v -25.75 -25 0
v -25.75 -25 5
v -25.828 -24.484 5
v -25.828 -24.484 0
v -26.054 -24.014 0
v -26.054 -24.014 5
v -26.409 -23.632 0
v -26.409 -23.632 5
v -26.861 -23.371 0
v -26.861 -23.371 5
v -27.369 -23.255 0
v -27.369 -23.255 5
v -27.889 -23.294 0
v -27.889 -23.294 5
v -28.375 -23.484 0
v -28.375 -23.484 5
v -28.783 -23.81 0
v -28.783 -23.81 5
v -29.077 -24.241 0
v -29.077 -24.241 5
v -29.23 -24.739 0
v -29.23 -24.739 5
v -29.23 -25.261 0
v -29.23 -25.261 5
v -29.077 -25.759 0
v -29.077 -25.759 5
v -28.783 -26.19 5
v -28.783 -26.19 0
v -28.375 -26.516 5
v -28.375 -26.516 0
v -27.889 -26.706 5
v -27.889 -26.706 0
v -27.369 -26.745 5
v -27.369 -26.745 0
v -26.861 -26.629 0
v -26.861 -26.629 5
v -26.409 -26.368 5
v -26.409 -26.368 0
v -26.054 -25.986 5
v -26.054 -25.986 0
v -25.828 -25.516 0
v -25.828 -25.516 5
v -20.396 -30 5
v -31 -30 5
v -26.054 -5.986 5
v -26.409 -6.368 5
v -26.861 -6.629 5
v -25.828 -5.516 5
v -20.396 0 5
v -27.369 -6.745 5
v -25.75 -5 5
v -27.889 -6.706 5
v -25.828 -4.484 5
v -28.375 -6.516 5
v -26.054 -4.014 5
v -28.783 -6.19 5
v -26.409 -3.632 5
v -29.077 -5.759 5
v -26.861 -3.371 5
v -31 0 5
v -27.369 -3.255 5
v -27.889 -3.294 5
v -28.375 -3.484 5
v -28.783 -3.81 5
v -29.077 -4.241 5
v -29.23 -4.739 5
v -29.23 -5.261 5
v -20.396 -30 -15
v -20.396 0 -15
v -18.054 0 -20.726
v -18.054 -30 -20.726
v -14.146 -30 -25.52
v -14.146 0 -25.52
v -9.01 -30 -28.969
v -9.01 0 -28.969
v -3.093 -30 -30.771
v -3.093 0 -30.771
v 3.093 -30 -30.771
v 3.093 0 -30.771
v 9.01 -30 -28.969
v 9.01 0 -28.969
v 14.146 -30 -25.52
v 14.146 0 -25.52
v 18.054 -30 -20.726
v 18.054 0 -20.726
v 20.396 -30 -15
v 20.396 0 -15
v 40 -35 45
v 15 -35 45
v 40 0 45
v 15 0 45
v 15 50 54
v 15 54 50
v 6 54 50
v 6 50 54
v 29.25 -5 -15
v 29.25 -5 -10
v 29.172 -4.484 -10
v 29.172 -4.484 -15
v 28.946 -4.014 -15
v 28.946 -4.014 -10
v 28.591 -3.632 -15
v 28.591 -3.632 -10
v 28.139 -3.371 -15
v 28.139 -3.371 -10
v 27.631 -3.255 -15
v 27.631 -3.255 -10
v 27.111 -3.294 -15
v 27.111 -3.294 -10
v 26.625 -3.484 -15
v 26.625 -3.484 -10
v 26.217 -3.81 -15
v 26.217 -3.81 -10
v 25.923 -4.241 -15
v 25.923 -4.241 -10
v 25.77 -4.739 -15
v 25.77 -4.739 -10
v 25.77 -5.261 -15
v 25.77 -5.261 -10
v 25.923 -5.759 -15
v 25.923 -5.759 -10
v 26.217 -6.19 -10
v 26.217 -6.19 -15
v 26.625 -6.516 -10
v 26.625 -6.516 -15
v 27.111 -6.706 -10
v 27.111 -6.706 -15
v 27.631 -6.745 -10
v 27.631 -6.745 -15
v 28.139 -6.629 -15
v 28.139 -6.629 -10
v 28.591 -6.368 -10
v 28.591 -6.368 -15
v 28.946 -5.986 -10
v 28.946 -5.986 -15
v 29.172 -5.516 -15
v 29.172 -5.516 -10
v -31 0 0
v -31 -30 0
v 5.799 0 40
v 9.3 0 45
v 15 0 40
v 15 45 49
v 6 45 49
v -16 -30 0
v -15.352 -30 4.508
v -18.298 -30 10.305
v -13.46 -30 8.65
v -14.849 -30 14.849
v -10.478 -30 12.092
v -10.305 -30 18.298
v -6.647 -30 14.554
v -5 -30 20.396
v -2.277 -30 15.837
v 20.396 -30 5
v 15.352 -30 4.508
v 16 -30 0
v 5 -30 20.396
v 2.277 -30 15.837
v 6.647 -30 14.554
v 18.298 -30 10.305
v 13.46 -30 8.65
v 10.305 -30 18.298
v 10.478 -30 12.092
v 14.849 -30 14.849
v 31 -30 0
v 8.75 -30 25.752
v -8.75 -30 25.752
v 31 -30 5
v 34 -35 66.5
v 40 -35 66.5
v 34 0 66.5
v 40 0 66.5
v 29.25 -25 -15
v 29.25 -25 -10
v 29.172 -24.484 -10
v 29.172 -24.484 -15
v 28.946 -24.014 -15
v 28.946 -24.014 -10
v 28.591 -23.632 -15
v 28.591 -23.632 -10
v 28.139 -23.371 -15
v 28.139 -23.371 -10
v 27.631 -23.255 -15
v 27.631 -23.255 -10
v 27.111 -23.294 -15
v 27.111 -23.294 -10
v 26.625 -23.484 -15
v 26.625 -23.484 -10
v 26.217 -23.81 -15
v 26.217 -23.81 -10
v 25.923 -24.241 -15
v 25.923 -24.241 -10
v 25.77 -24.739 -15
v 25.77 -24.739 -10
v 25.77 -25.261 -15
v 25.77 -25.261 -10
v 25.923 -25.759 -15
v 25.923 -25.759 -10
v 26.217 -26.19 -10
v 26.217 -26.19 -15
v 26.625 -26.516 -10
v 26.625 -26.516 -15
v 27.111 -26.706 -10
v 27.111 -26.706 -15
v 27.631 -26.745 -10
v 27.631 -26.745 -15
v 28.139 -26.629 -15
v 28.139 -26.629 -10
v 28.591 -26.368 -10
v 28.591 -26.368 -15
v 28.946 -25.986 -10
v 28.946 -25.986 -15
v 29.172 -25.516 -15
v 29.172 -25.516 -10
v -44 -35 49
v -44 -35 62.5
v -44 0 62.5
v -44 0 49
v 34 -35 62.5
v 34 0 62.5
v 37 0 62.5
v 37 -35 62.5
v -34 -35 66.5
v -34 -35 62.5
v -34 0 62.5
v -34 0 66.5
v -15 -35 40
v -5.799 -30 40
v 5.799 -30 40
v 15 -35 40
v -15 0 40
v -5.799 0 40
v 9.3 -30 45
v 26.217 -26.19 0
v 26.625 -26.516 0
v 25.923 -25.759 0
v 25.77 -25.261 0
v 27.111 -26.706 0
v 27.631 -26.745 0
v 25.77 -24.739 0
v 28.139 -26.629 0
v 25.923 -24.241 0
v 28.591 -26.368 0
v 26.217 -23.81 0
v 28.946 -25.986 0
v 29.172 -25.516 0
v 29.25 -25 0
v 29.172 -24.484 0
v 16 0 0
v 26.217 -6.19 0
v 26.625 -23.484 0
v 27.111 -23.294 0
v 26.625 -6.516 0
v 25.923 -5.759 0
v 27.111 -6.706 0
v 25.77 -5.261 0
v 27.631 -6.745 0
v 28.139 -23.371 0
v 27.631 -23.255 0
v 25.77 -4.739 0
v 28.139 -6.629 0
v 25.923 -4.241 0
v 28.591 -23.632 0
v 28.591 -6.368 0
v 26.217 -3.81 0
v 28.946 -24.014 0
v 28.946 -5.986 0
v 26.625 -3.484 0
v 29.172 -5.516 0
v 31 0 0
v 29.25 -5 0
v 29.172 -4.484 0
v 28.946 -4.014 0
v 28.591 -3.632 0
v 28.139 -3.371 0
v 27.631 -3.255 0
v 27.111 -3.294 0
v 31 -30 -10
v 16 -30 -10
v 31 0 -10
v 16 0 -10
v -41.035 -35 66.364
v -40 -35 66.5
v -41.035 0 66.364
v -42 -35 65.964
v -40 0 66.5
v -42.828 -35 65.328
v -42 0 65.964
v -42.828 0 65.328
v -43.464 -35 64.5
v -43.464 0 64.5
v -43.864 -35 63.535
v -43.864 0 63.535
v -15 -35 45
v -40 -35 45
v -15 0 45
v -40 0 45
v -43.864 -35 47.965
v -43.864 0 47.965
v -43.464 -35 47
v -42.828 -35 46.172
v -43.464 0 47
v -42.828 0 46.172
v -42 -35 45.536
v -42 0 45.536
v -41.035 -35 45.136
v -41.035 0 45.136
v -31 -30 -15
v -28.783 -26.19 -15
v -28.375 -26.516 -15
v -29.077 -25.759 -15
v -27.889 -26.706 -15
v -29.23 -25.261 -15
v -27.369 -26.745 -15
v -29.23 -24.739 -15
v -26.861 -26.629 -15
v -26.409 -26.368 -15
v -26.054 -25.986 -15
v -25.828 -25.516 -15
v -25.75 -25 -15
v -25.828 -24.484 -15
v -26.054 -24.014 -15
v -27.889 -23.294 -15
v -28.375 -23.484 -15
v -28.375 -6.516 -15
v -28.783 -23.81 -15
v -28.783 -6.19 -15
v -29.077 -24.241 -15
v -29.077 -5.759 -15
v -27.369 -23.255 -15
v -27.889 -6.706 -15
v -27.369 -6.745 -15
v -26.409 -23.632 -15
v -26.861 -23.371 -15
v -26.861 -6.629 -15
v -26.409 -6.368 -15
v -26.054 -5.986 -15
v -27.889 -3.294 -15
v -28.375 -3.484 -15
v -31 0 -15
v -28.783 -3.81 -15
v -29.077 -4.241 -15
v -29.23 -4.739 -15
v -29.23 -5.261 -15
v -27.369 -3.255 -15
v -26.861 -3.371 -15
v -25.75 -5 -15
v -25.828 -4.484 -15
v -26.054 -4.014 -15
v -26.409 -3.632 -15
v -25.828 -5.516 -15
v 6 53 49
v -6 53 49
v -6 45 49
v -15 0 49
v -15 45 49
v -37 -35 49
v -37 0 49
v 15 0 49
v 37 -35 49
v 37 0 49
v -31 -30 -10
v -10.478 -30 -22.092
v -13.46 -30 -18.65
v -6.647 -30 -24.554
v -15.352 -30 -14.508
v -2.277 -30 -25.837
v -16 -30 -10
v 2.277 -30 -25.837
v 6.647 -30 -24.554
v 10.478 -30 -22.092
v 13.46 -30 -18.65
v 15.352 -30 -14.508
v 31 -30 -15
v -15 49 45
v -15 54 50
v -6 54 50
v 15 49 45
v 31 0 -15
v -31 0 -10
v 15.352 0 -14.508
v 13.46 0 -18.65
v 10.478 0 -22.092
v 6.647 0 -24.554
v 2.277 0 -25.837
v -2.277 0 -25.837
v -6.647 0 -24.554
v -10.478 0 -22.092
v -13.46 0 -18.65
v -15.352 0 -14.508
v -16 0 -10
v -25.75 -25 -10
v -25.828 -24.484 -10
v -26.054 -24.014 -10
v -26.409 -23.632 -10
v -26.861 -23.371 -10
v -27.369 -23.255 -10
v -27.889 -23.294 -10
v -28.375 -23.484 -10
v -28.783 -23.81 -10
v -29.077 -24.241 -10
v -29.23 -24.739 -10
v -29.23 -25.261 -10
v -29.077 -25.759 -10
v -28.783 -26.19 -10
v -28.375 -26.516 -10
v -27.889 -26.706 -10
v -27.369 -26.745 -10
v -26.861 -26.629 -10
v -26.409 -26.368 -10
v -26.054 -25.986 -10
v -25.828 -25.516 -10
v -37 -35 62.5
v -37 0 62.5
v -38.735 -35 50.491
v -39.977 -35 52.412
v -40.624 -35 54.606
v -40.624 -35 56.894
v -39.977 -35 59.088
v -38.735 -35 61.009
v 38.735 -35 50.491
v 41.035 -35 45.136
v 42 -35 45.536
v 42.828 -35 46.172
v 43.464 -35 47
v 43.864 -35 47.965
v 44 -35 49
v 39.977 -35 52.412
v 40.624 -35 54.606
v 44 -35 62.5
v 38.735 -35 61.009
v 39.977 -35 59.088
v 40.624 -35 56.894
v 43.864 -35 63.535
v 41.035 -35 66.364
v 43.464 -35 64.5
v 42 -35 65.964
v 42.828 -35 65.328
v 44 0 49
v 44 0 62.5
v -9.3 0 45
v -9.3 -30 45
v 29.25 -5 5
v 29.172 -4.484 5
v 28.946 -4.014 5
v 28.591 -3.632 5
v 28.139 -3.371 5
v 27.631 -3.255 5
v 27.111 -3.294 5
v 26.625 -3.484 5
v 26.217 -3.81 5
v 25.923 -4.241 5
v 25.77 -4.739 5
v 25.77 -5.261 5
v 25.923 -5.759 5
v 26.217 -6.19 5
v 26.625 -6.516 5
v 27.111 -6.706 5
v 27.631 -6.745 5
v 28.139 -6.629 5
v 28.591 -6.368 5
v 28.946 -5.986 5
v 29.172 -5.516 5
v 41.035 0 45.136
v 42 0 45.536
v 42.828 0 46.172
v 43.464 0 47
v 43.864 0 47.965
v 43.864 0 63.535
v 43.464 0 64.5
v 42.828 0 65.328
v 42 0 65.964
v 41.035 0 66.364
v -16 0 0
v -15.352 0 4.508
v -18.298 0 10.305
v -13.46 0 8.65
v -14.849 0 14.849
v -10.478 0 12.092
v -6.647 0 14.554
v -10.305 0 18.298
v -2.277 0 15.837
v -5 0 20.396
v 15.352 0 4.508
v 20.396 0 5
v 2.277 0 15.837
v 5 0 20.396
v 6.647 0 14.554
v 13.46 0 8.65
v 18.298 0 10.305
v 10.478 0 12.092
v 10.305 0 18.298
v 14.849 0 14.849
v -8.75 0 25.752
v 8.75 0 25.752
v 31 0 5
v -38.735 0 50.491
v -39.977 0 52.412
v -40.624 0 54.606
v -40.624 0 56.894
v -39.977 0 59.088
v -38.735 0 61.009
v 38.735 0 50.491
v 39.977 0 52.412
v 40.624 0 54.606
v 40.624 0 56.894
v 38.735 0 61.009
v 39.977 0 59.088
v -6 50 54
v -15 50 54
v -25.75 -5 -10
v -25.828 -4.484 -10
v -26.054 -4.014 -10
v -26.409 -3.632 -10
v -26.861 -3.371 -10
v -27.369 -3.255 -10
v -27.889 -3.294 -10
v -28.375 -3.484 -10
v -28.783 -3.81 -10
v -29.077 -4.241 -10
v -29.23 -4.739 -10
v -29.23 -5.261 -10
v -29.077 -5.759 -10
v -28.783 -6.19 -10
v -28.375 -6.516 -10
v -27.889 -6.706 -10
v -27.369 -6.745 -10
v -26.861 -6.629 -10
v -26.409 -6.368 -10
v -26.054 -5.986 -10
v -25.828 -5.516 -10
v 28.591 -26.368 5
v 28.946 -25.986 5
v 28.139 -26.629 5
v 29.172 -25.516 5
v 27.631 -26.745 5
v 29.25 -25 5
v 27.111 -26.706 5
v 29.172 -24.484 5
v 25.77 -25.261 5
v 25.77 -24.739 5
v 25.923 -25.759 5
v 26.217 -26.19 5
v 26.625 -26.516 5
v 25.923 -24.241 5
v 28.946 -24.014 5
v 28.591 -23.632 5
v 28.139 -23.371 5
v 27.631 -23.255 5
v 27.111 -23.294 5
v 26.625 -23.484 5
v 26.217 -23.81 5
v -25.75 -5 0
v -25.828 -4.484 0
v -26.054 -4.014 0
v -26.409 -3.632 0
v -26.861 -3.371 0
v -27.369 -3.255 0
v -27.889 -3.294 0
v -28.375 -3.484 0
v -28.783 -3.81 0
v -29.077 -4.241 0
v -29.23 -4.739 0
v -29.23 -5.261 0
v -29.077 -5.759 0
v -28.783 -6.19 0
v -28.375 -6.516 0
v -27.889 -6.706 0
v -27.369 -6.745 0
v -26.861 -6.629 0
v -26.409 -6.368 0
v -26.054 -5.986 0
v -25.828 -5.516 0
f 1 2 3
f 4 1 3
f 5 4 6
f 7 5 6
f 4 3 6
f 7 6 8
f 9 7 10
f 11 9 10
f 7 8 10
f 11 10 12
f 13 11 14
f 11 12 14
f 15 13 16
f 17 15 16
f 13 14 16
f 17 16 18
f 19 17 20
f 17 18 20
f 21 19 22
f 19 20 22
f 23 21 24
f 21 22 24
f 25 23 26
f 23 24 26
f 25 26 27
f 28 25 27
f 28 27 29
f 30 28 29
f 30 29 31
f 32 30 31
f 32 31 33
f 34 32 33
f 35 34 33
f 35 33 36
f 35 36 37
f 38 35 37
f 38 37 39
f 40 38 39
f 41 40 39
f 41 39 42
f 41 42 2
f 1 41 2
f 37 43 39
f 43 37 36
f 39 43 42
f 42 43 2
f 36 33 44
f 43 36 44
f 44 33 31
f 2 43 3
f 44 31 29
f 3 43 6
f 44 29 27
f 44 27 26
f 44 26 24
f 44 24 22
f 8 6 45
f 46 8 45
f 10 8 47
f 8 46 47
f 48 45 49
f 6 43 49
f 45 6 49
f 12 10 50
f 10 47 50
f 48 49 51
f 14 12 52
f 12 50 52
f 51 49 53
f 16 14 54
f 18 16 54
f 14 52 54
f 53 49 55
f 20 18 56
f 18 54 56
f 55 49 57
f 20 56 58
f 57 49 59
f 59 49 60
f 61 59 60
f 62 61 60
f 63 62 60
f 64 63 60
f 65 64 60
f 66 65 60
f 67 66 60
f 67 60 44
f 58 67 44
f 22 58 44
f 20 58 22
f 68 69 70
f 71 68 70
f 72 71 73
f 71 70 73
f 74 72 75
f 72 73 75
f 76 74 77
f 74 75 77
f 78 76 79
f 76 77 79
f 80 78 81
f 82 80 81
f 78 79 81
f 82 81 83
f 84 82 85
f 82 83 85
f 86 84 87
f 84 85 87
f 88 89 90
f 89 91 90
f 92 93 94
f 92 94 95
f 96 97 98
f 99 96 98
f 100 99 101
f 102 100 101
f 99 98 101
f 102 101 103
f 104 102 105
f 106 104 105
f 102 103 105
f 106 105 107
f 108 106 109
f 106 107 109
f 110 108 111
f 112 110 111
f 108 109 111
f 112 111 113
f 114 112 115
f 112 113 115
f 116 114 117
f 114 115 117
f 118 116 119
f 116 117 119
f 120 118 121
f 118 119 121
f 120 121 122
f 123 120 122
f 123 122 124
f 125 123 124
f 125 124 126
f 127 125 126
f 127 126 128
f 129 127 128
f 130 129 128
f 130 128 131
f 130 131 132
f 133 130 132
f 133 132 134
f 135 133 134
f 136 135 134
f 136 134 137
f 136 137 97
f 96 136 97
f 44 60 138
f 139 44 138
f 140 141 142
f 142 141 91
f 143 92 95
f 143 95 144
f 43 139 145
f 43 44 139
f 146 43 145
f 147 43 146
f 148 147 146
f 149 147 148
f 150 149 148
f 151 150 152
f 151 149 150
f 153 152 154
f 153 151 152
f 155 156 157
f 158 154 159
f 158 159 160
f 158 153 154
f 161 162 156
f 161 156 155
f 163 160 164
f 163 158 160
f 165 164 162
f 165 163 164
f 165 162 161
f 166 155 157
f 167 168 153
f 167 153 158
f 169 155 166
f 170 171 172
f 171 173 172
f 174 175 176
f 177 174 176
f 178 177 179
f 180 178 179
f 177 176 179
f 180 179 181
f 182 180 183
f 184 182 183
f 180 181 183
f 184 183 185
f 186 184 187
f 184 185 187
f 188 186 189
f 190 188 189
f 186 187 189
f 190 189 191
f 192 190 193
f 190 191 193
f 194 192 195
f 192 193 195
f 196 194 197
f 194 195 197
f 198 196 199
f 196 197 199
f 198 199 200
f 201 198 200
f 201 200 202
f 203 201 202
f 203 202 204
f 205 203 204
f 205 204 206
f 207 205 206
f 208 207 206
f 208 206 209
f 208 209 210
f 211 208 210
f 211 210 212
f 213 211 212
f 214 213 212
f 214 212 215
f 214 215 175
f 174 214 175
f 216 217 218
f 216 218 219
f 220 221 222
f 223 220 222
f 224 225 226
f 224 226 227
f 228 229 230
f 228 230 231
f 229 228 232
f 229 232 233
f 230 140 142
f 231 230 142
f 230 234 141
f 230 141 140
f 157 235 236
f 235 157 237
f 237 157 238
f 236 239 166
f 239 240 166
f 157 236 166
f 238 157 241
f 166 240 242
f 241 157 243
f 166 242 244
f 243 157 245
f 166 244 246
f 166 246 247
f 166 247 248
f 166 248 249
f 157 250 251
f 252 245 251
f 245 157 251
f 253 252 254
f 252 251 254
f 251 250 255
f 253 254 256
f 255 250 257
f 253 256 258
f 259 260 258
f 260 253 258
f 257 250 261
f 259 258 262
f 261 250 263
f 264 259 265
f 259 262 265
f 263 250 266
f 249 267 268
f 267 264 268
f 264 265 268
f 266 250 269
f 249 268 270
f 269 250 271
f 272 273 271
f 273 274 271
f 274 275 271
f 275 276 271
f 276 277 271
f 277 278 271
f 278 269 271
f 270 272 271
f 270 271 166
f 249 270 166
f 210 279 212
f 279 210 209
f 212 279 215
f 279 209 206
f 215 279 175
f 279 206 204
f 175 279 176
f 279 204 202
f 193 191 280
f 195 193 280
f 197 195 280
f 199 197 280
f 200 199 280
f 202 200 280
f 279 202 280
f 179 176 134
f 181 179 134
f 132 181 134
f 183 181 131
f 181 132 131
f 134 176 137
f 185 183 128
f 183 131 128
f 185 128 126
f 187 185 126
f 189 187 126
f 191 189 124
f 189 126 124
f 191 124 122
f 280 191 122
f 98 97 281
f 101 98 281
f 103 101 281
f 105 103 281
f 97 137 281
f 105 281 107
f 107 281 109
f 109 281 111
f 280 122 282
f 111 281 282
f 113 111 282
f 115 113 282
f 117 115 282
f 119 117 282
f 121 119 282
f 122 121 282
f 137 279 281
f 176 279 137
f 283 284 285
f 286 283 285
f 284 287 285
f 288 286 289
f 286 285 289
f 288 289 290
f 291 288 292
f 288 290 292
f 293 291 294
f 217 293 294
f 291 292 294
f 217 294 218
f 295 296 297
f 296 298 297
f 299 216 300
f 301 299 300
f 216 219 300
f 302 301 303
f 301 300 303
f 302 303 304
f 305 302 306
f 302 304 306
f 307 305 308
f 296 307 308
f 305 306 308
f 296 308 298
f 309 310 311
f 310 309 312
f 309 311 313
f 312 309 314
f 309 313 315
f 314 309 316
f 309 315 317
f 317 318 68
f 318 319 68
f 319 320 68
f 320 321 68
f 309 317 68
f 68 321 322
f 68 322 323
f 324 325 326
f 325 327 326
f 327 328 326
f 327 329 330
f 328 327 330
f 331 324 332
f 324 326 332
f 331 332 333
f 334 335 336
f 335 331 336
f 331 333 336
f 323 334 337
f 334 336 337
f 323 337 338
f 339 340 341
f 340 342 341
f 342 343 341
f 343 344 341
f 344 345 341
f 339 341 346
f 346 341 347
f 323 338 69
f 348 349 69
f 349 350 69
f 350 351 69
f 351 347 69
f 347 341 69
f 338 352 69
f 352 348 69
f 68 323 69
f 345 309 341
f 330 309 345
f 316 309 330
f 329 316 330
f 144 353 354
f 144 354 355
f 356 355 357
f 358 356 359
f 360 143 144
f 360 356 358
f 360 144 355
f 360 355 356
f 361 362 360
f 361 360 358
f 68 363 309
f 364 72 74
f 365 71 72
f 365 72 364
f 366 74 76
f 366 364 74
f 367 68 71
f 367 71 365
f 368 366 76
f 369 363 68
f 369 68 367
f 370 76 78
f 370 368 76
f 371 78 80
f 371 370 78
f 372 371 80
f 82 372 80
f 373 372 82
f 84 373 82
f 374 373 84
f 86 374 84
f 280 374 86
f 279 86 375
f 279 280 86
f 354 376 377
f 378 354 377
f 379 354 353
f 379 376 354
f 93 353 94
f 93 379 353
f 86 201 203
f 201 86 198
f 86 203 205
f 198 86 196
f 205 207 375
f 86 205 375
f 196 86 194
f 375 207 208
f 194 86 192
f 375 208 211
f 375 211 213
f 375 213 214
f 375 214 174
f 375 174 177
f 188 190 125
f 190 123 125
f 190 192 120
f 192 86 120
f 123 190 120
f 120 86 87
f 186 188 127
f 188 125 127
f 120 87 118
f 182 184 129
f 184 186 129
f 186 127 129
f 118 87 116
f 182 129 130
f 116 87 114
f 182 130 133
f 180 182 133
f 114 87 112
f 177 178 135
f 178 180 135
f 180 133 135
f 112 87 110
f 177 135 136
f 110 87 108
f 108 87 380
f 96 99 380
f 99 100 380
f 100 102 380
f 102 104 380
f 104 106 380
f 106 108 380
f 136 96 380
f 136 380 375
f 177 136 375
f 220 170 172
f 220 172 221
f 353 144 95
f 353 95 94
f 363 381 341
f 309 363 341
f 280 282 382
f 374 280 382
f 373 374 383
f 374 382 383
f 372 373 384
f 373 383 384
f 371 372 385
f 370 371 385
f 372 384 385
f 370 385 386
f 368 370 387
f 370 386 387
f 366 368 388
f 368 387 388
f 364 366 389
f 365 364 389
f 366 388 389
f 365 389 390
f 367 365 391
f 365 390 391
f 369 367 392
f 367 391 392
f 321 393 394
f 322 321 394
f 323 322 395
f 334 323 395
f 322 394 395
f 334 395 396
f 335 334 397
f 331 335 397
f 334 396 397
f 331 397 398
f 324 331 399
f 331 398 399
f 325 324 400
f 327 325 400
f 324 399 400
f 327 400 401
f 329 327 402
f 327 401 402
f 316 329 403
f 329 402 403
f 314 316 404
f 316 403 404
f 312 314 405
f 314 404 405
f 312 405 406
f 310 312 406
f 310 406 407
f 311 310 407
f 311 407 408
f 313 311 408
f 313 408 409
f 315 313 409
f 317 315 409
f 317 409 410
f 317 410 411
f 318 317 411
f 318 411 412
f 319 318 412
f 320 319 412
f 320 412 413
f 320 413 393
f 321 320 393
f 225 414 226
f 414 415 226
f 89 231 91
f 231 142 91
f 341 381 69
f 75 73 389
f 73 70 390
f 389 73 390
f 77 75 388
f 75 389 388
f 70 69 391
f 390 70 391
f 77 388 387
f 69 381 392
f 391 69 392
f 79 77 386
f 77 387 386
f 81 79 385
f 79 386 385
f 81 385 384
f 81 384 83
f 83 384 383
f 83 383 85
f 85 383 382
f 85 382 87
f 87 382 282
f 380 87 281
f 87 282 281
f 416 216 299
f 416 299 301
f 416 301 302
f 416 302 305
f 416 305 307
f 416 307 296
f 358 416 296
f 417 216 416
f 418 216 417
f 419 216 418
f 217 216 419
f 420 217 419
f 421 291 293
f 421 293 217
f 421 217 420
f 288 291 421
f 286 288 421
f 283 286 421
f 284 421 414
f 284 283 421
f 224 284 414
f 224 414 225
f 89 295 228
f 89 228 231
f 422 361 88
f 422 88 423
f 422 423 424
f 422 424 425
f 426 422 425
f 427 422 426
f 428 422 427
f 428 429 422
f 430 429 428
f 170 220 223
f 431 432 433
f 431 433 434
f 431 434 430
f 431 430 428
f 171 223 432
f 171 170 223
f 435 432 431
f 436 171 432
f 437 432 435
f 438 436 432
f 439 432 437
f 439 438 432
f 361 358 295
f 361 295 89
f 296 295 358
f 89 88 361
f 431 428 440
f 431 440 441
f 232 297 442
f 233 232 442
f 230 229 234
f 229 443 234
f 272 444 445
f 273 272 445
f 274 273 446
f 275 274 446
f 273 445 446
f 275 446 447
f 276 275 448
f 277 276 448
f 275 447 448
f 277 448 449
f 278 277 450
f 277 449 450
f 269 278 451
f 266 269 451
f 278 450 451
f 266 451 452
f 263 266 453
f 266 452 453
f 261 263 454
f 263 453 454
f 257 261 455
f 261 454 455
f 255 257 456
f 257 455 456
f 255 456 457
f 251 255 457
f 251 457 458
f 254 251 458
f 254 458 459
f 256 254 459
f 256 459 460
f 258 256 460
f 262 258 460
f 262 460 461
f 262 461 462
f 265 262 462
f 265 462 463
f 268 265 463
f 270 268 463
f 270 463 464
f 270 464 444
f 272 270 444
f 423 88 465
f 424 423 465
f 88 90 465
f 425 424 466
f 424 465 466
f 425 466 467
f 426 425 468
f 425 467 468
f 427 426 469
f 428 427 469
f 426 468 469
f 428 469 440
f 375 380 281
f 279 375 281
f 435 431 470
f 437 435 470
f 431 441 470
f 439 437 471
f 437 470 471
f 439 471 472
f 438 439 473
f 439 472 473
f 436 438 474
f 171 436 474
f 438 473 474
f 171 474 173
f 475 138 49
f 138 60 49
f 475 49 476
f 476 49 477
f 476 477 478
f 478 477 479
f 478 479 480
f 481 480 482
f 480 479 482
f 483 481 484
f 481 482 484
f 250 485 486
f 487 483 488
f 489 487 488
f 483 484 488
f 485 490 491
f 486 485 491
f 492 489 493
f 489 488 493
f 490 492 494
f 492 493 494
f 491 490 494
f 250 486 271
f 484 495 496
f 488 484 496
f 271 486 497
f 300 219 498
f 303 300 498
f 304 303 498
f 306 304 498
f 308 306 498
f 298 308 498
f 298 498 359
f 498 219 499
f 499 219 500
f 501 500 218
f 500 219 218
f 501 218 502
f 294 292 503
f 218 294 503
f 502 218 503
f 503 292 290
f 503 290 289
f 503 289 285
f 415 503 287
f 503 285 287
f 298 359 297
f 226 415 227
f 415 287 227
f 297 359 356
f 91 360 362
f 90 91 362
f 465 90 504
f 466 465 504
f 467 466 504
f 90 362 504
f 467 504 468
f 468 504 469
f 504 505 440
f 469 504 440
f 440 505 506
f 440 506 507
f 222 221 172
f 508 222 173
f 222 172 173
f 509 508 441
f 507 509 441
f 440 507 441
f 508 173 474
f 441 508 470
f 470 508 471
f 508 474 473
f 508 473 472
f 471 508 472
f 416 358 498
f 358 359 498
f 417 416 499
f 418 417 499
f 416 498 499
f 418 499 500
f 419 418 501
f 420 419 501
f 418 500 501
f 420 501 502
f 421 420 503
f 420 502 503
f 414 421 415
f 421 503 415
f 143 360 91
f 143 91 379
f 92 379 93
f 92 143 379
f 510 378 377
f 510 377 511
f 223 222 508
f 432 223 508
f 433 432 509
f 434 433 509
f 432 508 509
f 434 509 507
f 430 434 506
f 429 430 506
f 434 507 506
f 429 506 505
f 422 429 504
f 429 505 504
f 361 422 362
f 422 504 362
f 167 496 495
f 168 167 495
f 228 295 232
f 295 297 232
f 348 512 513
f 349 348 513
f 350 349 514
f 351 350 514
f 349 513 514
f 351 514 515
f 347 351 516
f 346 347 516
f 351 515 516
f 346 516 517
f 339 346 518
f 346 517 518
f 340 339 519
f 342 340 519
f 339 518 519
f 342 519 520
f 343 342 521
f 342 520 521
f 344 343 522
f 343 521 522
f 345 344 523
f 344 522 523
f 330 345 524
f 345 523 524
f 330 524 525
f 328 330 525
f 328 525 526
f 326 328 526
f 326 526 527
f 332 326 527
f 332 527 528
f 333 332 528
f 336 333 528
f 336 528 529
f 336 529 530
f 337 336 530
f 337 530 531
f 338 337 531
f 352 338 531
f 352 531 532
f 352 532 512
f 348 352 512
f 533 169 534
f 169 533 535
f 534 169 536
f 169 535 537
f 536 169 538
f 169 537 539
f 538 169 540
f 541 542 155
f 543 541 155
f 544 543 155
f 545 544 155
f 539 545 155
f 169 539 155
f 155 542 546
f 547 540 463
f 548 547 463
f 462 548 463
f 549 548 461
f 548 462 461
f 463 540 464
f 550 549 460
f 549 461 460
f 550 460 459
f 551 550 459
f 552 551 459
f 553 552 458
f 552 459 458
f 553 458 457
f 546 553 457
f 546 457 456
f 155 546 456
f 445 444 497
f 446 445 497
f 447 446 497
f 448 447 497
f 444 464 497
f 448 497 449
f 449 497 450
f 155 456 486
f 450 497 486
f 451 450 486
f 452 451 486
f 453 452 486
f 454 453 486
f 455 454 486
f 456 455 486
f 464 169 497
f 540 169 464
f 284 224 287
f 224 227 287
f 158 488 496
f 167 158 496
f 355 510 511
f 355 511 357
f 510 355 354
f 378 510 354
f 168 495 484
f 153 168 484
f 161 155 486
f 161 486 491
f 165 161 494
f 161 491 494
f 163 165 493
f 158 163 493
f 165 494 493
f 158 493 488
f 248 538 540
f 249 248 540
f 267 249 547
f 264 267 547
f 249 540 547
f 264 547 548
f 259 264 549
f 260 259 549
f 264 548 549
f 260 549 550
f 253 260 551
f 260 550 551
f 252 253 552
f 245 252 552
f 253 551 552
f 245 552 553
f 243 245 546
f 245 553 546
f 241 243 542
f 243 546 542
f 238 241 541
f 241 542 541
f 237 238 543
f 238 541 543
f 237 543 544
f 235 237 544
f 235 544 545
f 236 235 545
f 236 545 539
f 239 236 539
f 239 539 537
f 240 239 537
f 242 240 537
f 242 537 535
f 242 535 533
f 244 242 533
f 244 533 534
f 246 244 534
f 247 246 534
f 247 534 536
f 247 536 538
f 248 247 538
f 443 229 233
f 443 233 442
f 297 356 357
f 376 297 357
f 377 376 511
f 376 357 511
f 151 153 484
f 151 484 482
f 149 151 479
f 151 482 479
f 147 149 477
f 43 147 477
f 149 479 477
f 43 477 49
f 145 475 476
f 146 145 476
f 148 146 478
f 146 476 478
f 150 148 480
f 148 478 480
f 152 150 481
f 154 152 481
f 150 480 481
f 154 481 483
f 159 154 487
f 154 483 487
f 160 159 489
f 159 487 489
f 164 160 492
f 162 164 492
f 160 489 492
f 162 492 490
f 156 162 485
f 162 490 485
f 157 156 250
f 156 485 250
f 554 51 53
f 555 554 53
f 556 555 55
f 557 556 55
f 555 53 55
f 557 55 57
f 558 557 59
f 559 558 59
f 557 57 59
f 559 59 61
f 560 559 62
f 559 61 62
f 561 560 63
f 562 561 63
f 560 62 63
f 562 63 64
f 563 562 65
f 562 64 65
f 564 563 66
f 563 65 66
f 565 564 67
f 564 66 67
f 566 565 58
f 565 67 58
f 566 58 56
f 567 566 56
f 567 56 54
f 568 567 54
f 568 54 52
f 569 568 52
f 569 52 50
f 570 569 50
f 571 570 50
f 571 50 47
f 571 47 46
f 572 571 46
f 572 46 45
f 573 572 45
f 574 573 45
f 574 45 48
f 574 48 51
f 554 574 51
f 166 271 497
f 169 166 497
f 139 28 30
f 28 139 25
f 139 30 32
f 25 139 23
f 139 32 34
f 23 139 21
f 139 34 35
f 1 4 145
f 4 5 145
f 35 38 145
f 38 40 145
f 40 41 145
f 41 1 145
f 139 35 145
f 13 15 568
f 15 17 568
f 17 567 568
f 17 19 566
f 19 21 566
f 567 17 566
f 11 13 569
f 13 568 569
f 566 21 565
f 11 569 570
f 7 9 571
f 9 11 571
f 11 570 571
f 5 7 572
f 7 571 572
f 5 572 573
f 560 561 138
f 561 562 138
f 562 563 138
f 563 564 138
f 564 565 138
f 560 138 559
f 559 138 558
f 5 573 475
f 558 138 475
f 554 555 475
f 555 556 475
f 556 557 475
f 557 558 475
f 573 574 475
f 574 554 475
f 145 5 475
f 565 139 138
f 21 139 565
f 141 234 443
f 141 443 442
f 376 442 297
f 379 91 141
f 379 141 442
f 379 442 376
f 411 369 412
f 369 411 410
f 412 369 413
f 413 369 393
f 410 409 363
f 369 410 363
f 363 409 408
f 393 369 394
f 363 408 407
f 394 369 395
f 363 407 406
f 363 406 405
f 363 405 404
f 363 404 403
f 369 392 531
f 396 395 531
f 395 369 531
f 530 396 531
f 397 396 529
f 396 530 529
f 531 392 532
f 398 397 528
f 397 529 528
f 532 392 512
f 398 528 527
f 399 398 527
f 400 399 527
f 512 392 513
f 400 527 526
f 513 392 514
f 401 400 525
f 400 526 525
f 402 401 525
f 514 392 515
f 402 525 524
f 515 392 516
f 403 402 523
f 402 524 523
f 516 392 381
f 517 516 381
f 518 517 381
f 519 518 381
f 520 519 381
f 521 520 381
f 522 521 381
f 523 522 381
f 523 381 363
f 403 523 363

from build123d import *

# Parameters (mm, degrees)
F3_DEPTH      = 30
F4_DEPTH      = 5
F6_DEPTH      = 15
F6_DEPTH_BACK = 15
F7_DEPTH      = 6
F8_DEPTH      = 30
F9_DEPTH      = 30
F10_R         = 1.75
F11_DEPTH     = 50


# Not quite as in the source:
# - a feature names something its author has since deleted; it is built from what else it names


with BuildPart() as f3:
    # F2 (on offset) → F3 (new body)
    with BuildSketch(Plane.XZ.offset(30)):
        with BuildLine():
            Line((37, 49), (-37, 49))
            ThreePointArc((-37, 49), (-40.7061089907, 55.75), (-37, 62.5))
            Line((-37, 62.5), (-34, 62.5))
            Line((-34, 62.5), (-34, 66.5))
            Line((-34, 66.5), (-40, 66.5))
            ThreePointArc((-40, 66.5), (-42.8284271247, 65.3284271247), (-44, 62.5))
            Line((-44, 62.5), (-44, 49))
            ThreePointArc((-44, 49), (-42.8284271247, 46.1715728753), (-40, 45))
            Line((-40, 45), (-15, 45))
            Line((-15, 45), (-15, 40))
            Line((-15, 40), (-5.798962309, 40))
            Line((-5.798962309, 40), (-9.3, 45))
            Line((-9.3, 45), (9.3, 45))
            Line((9.3, 45), (5.798962309, 40))
            Line((5.798962309, 40), (15, 40))
            Line((15, 40), (15, 45))
            Line((15, 45), (40, 45))
            ThreePointArc((40, 45), (42.8284271247, 46.1715728753), (44, 49))
            Line((44, 49), (44, 62.5))
            ThreePointArc((44, 62.5), (42.8284271247, 65.3284271247), (40, 66.5))
            Line((40, 66.5), (34, 66.5))
            Line((34, 66.5), (34, 62.5))
            Line((34, 62.5), (37, 62.5))
            ThreePointArc((37, 62.5), (40.7061089907, 55.75), (37, 49))
        make_face()
    extrude(amount=-F3_DEPTH)

    # F2 (on offset) → F4 (join)
    with BuildSketch(Plane.XZ.offset(30)):
        with BuildLine():
            Line((37, 49), (-37, 49))
            ThreePointArc((-37, 49), (-40.7061089907, 55.75), (-37, 62.5))
            Line((-37, 62.5), (-34, 62.5))
            Line((-34, 62.5), (-34, 66.5))
            Line((-34, 66.5), (-40, 66.5))
            ThreePointArc((-40, 66.5), (-42.8284271247, 65.3284271247), (-44, 62.5))
            Line((-44, 62.5), (-44, 49))
            ThreePointArc((-44, 49), (-42.8284271247, 46.1715728753), (-40, 45))
            Line((-40, 45), (-15, 45))
            Line((-15, 45), (-15, 40))
            Line((-15, 40), (-5.798962309, 40))
            Line((-5.798962309, 40), (-9.3, 45))
            Line((-9.3, 45), (9.3, 45))
            Line((9.3, 45), (5.798962309, 40))
            Line((5.798962309, 40), (15, 40))
            Line((15, 40), (15, 45))
            Line((15, 45), (40, 45))
            ThreePointArc((40, 45), (42.8284271247, 46.1715728753), (44, 49))
            Line((44, 49), (44, 62.5))
            ThreePointArc((44, 62.5), (42.8284271247, 65.3284271247), (40, 66.5))
            Line((40, 66.5), (34, 66.5))
            Line((34, 66.5), (34, 62.5))
            Line((34, 62.5), (37, 62.5))
            ThreePointArc((37, 62.5), (40.7061089907, 55.75), (37, 49))
        make_face()
        Polygon((-9.3, 45), (-5.798962309, 40), (5.798962309, 40), (9.3, 45), align=None)
    extrude(amount=F4_DEPTH)

    # F5 (on Right) → F6 (join, two sides)
    with BuildSketch(Plane.YZ) as f6_sk:
        Polygon((45, 49), (0, 49), (0, 45), (49, 45), (53, 49), align=None)
        Polygon((50, 54), (45, 49), (53, 49), (54, 50), align=None)
    extrude(amount=F6_DEPTH)
    extrude(f6_sk.sketch, amount=-F6_DEPTH_BACK)

    # F5 (on Right) → F7 (cut, symmetric)
    with BuildSketch(Plane.YZ):
        Polygon((50, 54), (45, 49), (53, 49), (54, 50), align=None)
    extrude(amount=F7_DEPTH, both=True, mode=Mode.SUBTRACT)


with BuildPart() as f8:
    # F0 (on Front) → F8 (new body)
    with BuildSketch(Plane.XZ):
        with BuildLine():
            Line((-31, 0), (-21, 0))
            ThreePointArc((-21, 0), (-20.8484728355, 2.5181700556), (-20.3960780544, 5))
            Line((-20.3960780544, 5), (-31, 5))
            Line((-31, 5), (-31, 0))
        make_face()
        with BuildLine():
            Line((-21, 0), (-16, 0))
            Line((-16, 0), (-16, 5))
            Line((-16, 5), (-20.3960780544, 5))
            ThreePointArc((-20.3960780544, 5), (-20.8484728355, 2.5181700556), (-21, 0))
        make_face()
        with BuildLine():
            ThreePointArc((-16, 0), (0, 16), (16, 0))
            Line((16, 0), (16, 5))
            Line((16, 5), (20.3960780544, 5))
            ThreePointArc((20.3960780544, 5), (14.8492424049, 14.8492424049), (5, 20.3960780544))
            ThreePointArc((5, 20.3960780544), (0, 21), (-5, 20.3960780544))
            ThreePointArc((-5, 20.3960780544), (-14.8492424049, 14.8492424049), (-20.3960780544, 5))
            Line((-20.3960780544, 5), (-16, 5))
            Line((-16, 5), (-16, 0))
        make_face()
        with BuildLine():
            Line((16, 5), (16, 0))
            Line((16, 0), (21, 0))
            ThreePointArc((21, 0), (20.8484728355, 2.5181700556), (20.3960780544, 5))
            Line((20.3960780544, 5), (16, 5))
        make_face()
        with BuildLine():
            ThreePointArc((20.3960780544, 5), (20.8484728355, 2.5181700556), (21, 0))
            Line((21, 0), (31, 0))
            Line((31, 0), (31, 5))
            Line((31, 5), (20.3960780544, 5))
        make_face()
        with BuildLine():
            ThreePointArc((-5, 20.3960780544), (0, 21), (5, 20.3960780544))
            Line((5, 20.3960780544), (8.75, 25.7516330797))
            Line((8.75, 25.7516330797), (-8.75, 25.7516330797))
            Line((-8.75, 25.7516330797), (-5, 20.3960780544))
        make_face()
    extrude(amount=F8_DEPTH)


with BuildPart() as f9:
    # F0 (on Front) → F9 (new body)
    with BuildSketch(Plane.XZ):
        with BuildLine():
            ThreePointArc((-20.3960780544, -15), (-20.8484728355, -12.5181700556), (-21, -10))
            Line((-21, -10), (-31, -10))
            Line((-31, -10), (-31, -15))
            Line((-31, -15), (-20.3960780544, -15))
        make_face()
        with BuildLine():
            Line((-16, -15), (-16, -10))
            Line((-16, -10), (-21, -10))
            ThreePointArc((-21, -10), (-20.8484728355, -12.5181700556), (-20.3960780544, -15))
            Line((-20.3960780544, -15), (-16, -15))
        make_face()
        with BuildLine():
            ThreePointArc((16, -10), (0, -26), (-16, -10))
            Line((-16, -10), (-16, -15))
            Line((-16, -15), (-20.3960780544, -15))
            ThreePointArc((-20.3960780544, -15), (0, -31), (20.3960780544, -15))
            Line((20.3960780544, -15), (16, -15))
            Line((16, -15), (16, -10))
        make_face()
        with BuildLine():
            Line((21, -10), (16, -10))
            Line((16, -10), (16, -15))
            Line((16, -15), (20.3960780544, -15))
            ThreePointArc((20.3960780544, -15), (20.8484728355, -12.5181700556), (21, -10))
        make_face()
        with BuildLine():
            Line((31, -10), (21, -10))
            ThreePointArc((21, -10), (20.8484728355, -12.5181700556), (20.3960780544, -15))
            Line((20.3960780544, -15), (31, -15))
            Line((31, -15), (31, -10))
        make_face()
    extrude(amount=F9_DEPTH)


with BuildPart() as f11_tool:
    # F10 (on face) → F11 (new body)
    with BuildSketch(Plane.XY.offset(5)):
        with Locations((-27.5, -25)):
            Circle(F10_R)
        with Locations((-27.5, -5)):
            Circle(F10_R)
        with Locations((27.5, -5)):
            Circle(F10_R)
        with Locations((27.5, -25)):
            Circle(F10_R)
    extrude(amount=-F11_DEPTH)


with BuildPart() as f8_1:
    add(f8.part)

    # F11: cut by f11_tool
    add(f11_tool.part, mode=Mode.SUBTRACT)


with BuildPart() as f9_1:
    add(f9.part)

    # F11: cut by f11_tool
    add(f11_tool.part, mode=Mode.SUBTRACT)


solid = Compound([f3.part, f8_1.part, f9_1.part])
